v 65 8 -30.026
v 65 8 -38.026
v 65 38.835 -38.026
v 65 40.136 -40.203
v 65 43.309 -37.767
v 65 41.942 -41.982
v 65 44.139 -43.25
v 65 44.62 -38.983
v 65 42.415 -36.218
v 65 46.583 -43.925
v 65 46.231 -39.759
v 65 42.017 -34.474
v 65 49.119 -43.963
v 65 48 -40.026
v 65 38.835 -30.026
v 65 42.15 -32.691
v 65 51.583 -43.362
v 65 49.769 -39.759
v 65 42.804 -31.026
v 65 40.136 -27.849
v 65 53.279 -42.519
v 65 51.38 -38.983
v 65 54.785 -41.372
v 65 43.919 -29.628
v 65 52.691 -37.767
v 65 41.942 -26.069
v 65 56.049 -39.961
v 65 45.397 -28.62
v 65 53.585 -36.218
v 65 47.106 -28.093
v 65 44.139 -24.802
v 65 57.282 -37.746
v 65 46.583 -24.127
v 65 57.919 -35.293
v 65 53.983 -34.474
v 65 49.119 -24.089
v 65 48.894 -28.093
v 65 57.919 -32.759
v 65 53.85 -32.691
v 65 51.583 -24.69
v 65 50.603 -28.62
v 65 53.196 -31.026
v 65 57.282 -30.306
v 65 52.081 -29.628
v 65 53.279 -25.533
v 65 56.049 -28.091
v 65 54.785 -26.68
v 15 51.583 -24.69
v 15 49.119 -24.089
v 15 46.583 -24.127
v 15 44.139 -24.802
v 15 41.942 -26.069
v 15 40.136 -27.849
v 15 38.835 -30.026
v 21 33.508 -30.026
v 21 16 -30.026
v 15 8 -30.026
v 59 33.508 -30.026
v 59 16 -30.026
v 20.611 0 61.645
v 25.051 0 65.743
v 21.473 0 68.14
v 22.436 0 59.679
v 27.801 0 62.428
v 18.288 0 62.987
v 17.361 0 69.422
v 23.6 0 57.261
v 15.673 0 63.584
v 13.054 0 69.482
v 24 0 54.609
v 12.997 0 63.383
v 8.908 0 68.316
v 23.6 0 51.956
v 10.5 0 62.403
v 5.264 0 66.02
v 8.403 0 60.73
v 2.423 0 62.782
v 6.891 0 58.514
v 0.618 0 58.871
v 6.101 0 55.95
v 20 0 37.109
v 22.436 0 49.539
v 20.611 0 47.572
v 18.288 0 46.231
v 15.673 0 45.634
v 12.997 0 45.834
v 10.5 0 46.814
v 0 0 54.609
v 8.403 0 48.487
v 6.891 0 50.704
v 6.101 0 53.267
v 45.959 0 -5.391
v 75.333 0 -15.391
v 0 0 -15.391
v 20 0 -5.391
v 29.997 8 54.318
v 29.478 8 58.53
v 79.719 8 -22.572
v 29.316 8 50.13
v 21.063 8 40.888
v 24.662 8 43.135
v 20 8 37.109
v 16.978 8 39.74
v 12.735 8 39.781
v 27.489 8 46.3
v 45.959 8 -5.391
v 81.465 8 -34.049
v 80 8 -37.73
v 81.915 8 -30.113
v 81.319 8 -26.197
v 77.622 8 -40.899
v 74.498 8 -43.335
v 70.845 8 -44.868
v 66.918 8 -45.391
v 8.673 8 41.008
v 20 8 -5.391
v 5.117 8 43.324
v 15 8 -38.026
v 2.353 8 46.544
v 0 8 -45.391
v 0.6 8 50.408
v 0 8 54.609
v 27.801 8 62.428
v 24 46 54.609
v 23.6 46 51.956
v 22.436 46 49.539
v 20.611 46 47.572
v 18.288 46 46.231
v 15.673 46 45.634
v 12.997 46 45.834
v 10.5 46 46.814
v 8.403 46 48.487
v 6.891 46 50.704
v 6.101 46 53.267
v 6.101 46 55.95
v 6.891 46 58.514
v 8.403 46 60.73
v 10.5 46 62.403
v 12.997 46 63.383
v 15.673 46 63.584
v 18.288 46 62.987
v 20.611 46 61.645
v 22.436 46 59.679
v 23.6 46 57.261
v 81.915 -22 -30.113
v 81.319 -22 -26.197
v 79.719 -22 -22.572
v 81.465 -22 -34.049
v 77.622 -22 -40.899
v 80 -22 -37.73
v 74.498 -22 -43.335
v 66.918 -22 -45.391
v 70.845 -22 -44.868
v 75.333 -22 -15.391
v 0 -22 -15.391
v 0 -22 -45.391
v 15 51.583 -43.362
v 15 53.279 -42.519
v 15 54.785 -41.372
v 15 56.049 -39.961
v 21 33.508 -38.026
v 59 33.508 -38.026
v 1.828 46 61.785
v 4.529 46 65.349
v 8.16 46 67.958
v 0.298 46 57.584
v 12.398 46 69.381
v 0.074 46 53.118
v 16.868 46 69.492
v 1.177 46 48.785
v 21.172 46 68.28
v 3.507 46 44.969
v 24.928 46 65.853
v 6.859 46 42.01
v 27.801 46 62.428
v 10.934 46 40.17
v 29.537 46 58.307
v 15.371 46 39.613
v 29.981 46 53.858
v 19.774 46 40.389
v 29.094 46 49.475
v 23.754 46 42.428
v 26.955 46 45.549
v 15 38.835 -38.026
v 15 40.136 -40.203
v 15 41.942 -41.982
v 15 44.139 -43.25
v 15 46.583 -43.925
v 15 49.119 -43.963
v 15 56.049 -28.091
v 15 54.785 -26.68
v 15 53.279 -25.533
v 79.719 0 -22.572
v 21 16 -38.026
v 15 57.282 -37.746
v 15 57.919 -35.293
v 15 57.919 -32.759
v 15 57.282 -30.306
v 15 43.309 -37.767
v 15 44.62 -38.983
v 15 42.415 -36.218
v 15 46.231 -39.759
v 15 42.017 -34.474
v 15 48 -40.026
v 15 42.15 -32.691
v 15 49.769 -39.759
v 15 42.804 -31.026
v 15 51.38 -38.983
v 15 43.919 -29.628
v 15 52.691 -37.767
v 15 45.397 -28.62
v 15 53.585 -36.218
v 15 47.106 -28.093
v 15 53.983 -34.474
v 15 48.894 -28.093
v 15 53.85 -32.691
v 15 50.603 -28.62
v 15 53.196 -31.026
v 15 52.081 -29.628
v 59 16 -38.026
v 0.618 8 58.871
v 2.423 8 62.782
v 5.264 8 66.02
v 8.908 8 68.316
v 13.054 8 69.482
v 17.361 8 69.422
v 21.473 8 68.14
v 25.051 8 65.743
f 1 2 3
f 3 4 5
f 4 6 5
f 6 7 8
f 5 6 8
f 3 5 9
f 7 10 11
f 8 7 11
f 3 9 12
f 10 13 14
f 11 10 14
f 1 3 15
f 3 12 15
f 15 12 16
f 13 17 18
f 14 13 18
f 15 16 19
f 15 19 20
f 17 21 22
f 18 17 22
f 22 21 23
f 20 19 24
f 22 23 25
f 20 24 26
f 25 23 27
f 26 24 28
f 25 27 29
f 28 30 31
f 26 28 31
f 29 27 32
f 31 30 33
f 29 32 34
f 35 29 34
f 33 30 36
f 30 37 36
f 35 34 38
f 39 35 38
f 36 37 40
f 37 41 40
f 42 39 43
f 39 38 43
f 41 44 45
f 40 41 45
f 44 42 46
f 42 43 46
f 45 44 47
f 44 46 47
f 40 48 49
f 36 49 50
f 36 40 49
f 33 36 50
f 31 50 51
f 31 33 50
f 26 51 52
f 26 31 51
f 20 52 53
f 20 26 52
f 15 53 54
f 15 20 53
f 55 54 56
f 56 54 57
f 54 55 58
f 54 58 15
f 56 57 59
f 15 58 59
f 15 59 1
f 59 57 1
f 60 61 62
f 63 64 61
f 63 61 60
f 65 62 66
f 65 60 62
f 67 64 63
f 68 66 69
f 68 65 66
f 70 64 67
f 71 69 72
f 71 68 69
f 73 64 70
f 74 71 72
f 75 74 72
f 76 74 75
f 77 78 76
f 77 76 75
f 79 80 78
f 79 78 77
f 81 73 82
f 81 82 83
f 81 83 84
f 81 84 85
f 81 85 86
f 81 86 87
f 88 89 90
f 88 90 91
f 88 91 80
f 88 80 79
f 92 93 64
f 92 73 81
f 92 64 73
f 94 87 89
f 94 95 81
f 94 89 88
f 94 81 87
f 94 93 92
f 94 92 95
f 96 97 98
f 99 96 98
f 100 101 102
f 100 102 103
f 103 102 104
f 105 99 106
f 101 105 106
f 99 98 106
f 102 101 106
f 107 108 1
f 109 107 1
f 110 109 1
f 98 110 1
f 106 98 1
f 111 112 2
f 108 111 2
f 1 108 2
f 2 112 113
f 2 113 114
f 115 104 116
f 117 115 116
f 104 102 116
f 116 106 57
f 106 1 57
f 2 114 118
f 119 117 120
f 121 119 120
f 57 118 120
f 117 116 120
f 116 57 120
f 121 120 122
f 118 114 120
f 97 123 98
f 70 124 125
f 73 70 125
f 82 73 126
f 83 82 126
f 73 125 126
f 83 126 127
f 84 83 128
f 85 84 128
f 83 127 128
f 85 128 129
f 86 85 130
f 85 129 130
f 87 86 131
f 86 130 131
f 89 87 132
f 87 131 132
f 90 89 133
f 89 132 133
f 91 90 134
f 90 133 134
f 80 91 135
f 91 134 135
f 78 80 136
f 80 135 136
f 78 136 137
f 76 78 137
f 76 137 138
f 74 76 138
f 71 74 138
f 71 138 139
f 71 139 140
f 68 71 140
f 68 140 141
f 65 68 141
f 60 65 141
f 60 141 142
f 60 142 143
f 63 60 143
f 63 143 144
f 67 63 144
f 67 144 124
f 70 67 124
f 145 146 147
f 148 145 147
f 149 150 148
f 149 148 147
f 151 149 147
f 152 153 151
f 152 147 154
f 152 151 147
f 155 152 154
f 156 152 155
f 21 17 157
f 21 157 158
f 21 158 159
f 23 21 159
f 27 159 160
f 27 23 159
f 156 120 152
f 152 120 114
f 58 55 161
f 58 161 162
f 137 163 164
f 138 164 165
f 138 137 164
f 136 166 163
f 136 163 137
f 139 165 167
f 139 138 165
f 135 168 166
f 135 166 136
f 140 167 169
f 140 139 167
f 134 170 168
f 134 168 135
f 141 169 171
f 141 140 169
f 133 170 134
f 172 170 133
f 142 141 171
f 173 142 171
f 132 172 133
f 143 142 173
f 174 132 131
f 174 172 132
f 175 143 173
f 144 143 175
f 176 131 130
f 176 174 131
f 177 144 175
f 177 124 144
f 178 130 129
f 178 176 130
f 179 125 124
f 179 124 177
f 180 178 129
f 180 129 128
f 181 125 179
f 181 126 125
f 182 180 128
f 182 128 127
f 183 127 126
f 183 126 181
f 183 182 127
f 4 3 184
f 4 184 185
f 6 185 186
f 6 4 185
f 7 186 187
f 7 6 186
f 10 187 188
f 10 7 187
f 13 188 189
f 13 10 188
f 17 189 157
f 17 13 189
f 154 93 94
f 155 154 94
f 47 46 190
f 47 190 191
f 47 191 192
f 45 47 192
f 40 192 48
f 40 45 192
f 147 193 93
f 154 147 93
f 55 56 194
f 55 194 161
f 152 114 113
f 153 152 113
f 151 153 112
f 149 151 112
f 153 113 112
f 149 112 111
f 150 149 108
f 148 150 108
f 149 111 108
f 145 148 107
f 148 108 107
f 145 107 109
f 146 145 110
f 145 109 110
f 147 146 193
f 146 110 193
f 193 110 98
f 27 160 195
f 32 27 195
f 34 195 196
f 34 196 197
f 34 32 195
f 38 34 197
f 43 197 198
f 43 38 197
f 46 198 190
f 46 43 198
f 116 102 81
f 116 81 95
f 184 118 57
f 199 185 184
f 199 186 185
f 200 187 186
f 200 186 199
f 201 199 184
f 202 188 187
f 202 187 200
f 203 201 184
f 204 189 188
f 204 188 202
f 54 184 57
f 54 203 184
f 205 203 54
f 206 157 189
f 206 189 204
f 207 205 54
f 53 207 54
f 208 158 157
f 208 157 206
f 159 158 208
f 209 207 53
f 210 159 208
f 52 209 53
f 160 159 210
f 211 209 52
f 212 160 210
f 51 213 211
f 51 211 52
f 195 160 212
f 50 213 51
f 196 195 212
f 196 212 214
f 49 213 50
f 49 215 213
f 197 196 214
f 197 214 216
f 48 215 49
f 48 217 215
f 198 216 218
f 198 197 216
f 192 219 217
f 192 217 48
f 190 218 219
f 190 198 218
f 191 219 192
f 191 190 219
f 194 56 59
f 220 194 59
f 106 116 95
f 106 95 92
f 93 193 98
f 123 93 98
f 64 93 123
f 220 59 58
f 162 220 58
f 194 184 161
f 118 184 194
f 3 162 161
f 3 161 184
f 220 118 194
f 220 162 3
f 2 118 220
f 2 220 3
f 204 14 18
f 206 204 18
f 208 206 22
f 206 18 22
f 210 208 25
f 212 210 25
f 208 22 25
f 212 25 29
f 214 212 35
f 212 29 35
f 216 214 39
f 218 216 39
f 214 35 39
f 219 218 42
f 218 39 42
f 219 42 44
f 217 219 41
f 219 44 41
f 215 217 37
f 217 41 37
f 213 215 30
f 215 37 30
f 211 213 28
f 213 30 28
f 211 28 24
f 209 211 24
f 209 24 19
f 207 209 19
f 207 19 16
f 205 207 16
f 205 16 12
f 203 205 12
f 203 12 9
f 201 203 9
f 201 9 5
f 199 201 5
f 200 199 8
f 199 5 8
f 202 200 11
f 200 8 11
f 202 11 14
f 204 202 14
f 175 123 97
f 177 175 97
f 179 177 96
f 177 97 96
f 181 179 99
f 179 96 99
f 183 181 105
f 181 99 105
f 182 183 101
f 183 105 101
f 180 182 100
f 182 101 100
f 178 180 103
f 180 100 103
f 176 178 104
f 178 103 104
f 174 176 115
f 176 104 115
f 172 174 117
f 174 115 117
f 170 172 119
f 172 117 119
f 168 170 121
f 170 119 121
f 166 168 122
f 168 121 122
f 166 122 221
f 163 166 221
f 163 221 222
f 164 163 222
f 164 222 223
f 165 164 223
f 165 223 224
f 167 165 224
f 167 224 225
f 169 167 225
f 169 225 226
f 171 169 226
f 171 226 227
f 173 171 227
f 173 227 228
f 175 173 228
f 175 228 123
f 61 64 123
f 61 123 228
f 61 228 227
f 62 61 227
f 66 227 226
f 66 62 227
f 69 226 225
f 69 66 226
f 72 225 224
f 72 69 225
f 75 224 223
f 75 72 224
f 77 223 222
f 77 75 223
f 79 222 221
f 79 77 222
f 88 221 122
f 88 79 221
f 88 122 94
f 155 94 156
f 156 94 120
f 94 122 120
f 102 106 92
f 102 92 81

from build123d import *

# Parameters (mm, degrees)
BASE_TRIANGLE_DEPTH   = 8
SKETCH2_W             = 50
SKETCH2_H             = 8
RECTANGLE_BLOCK_DEPTH = 38
CUT_EXTRUDE2_REACH    = 17.365
SKETCH3_W             = 38
SKETCH3_H             = 18
CYINDER_BLOCK_DEPTH   = 50
CUT_EXTRUDE3_REACH    = 68.918
SKETCH5_R             = 6
BOSS_EXTRUDE5_DEPTH   = 50
CUT_EXTRUDE4_DEPTH    = 50
SKETCH11_R            = 6
CUT_EXTRUDE5_DEPTH    = 50
CUT_EXTRUDE6_REACH    = 17.365
SKETCH12_W            = 38
SKETCH12_H            = 17.507702416
BOSS_EXTRUDE6_DEPTH   = 38
CUT_EXTRUDE7_REACH    = 48
SKETCH14_R            = 9
CUT_EXTRUDE9_REACH    = 10
BOSS_EXTRUDE7_DEPTH   = 22


with BuildPart() as part:
    # Sketch1 → Base triangle (new body)
    with BuildSketch(Plane(origin=(0, 0, 0), x_dir=(1, 0, 0), z_dir=(0, 1, 0))):
        with BuildLine():
            Line((0, -54.608695652), (0, 45.391304348))
            Line((0, 45.391304348), (66.917901683, 45.391304348))
            ThreePointArc((66.917901683, 45.391304348), (80, 37.730153279), (79.71890745, 22.572464832))
            Line((79.71890745, 22.572464832), (27.801005766, -62.427535168))
            ThreePointArc((27.801005766, -62.427535168), (10.938909413, -69.048485929), (0, -54.608695652))
        make_face()
    extrude(amount=BASE_TRIANGLE_DEPTH)

    # Sketch2 → Rectangle Block (add)
    with BuildSketch(Plane(origin=(0, 8, 0), x_dir=(1, 0, 0), z_dir=(0, 1, 0))):
        with Locations((40, 34.025974009)):
            Rectangle(SKETCH2_W, SKETCH2_H)
    extrude(amount=RECTANGLE_BLOCK_DEPTH)

    # Sketch3 → Cut-Extrude2 (cut, up to next)
    with BuildSketch(Plane.XY.offset(-30.025974009), mode=Mode.PRIVATE) as cut_extrude2_sk1:
        with Locations((40, 25)):
            Rectangle(SKETCH3_W, SKETCH3_H)
    cut_extrude2_tool1 = extrude(cut_extrude2_sk1.sketch, amount=-CUT_EXTRUDE2_REACH, mode=Mode.PRIVATE) & part.part
    add(cut_extrude2_tool1.solids().sort_by_distance((40, 25, -30.025974))[0], mode=Mode.SUBTRACT)

    # Sketch4 → Cyinder Block (add)
    with BuildSketch(Plane.ZY.offset(-15)):
        with BuildLine():
            ThreePointArc((-24.025974009, 55.16515139), (-39.503199584, 63.531751655), (-38.025974009, 46))
            Line((-38.025974009, 46), (-30.025974009, 46))
            ThreePointArc((-30.025974009, 46), (-25.659373744, 49.687925815), (-24.025974009, 55.16515139))
        make_face()
        with BuildLine():
            Line((-30.025974009, 46), (-38.025974009, 46))
            ThreePointArc((-38.025974009, 46), (-34.025974009, 45.16515139), (-30.025974009, 46))
        make_face()
    extrude(amount=-CYINDER_BLOCK_DEPTH)

    # Sketch5 → Cut-Extrude3 (cut, up to next)
    with BuildSketch(Plane.ZY.offset(-15), mode=Mode.PRIVATE) as cut_extrude3_sk1:
        with Locations((-34.025974009, 55.16515139)):
            Circle(SKETCH5_R)
    cut_extrude3_tool1 = extrude(cut_extrude3_sk1.sketch, amount=-CUT_EXTRUDE3_REACH, mode=Mode.PRIVATE) & part.part
    add(cut_extrude3_tool1.solids().sort_by_distance((15, 55.165151, -34.025974))[0], mode=Mode.SUBTRACT)

    # Sketch9 → Boss-Extrude5 (add)
    with BuildSketch(Plane(origin=(65, 0, 0), x_dir=(0, 0, -1), z_dir=(1, 0, 0))):
        with BuildLine():
            Line((30.025974009, 8), (38.025974009, 8))
            Line((38.025974009, 8), (38.025974009, 38.83484861))
            ThreePointArc((38.025974009, 38.83484861), (34.025974009, 58), (30.025974009, 38.83484861))
            Line((30.025974009, 38.83484861), (30.025974009, 8))
        make_face()
    extrude(amount=-BOSS_EXTRUDE5_DEPTH)

    # Sketch10 → Cut-Extrude4 (cut)
    with BuildSketch(Plane(origin=(65, 0, 0), x_dir=(0, 0, -1), z_dir=(1, 0, 0))):
        with BuildLine():
            ThreePointArc((43.362201908, 51.582575695), (34.025974009, 58), (24.68974611, 51.582575695))
            ThreePointArc((24.68974611, 51.582575695), (34.025974009, 65.16515139), (43.362201908, 51.582575695))
        make_face()
    extrude(amount=-CUT_EXTRUDE4_DEPTH, mode=Mode.SUBTRACT)

    # Sketch11 → Cut-Extrude5 (cut)
    with BuildSketch(Plane(origin=(65, 0, 0), x_dir=(0, 0, -1), z_dir=(1, 0, 0))):
        with Locations((34.025974009, 48)):
            Circle(SKETCH11_R)
    extrude(amount=-CUT_EXTRUDE5_DEPTH, mode=Mode.SUBTRACT)

    # Sketch12 → Cut-Extrude6 (cut, up to next)
    with BuildSketch(Plane.XY.offset(-30.025974009), mode=Mode.PRIVATE) as cut_extrude6_sk1:
        with Locations((40, 24.753851208)):
            Rectangle(SKETCH12_W, SKETCH12_H)
    cut_extrude6_tool1 = extrude(cut_extrude6_sk1.sketch, amount=-CUT_EXTRUDE6_REACH, mode=Mode.PRIVATE) & part.part
    add(cut_extrude6_tool1.solids().sort_by_distance((40, 24.753851, -30.025974))[0], mode=Mode.SUBTRACT)

    # Sketch13 → Boss-Extrude6 (add)
    with BuildSketch(Plane(origin=(0, 8, 0), x_dir=(1, 0, 0), z_dir=(0, 1, 0))):
        with BuildLine():
            ThreePointArc((30, -54.608695652), (15, -39.608695652), (0, -54.608695652))
            ThreePointArc((0, -54.608695652), (10.938909413, -69.048485929), (27.801005766, -62.427535168))
            ThreePointArc((27.801005766, -62.427535168), (29.439790277, -58.669786239), (30, -54.608695652))
        make_face()
    extrude(amount=BOSS_EXTRUDE6_DEPTH)

    # Sketch14 → Cut-Extrude7 (cut, up to next)
    with BuildSketch(Plane(origin=(0, 46, 0), x_dir=(1, 0, 0), z_dir=(0, 1, 0)), mode=Mode.PRIVATE) as cut_extrude7_sk1:
        with Locations((15, -54.608695652)):
            Circle(SKETCH14_R)
    cut_extrude7_tool1 = extrude(cut_extrude7_sk1.sketch, amount=-CUT_EXTRUDE7_REACH, mode=Mode.PRIVATE) & part.part
    add(cut_extrude7_tool1.solids().sort_by_distance((15, 46, 54.608696))[0], mode=Mode.SUBTRACT)

    # Sketch15 → Cut-Extrude9 (cut, up to next)
    with BuildSketch(Plane(origin=(0, 8, 0), x_dir=(1, 0, 0), z_dir=(0, 1, 0)), mode=Mode.PRIVATE) as cut_extrude9_sk1:
        Polygon((20, -37.108695652), (20, 5.391304348), (45.958950842, 5.391304348), align=None)
    cut_extrude9_tool1 = extrude(cut_extrude9_sk1.sketch, amount=-CUT_EXTRUDE9_REACH, mode=Mode.PRIVATE) & part.part
    add(cut_extrude9_tool1.solids().sort_by_distance((28.652984, 8, 8.775362))[0], mode=Mode.SUBTRACT)

    # Sketch20 → Boss-Extrude7 (add)
    with BuildSketch(Plane(origin=(0, 0, 0), x_dir=(-1, 0, 0), z_dir=(0, -1, 0))):
        with BuildLine():
            Line((-75.332662932, 15.391304348), (0, 15.391304348))
            Line((0, 15.391304348), (0, 45.391304348))
            Line((0, 45.391304348), (-66.917901683, 45.391304348))
            ThreePointArc((-66.917901683, 45.391304348), (-80, 37.730153279), (-79.71890745, 22.572464832))
            Line((-79.71890745, 22.572464832), (-75.332662932, 15.391304348))
        make_face()
    extrude(amount=BOSS_EXTRUDE7_DEPTH)


solid = part.part
